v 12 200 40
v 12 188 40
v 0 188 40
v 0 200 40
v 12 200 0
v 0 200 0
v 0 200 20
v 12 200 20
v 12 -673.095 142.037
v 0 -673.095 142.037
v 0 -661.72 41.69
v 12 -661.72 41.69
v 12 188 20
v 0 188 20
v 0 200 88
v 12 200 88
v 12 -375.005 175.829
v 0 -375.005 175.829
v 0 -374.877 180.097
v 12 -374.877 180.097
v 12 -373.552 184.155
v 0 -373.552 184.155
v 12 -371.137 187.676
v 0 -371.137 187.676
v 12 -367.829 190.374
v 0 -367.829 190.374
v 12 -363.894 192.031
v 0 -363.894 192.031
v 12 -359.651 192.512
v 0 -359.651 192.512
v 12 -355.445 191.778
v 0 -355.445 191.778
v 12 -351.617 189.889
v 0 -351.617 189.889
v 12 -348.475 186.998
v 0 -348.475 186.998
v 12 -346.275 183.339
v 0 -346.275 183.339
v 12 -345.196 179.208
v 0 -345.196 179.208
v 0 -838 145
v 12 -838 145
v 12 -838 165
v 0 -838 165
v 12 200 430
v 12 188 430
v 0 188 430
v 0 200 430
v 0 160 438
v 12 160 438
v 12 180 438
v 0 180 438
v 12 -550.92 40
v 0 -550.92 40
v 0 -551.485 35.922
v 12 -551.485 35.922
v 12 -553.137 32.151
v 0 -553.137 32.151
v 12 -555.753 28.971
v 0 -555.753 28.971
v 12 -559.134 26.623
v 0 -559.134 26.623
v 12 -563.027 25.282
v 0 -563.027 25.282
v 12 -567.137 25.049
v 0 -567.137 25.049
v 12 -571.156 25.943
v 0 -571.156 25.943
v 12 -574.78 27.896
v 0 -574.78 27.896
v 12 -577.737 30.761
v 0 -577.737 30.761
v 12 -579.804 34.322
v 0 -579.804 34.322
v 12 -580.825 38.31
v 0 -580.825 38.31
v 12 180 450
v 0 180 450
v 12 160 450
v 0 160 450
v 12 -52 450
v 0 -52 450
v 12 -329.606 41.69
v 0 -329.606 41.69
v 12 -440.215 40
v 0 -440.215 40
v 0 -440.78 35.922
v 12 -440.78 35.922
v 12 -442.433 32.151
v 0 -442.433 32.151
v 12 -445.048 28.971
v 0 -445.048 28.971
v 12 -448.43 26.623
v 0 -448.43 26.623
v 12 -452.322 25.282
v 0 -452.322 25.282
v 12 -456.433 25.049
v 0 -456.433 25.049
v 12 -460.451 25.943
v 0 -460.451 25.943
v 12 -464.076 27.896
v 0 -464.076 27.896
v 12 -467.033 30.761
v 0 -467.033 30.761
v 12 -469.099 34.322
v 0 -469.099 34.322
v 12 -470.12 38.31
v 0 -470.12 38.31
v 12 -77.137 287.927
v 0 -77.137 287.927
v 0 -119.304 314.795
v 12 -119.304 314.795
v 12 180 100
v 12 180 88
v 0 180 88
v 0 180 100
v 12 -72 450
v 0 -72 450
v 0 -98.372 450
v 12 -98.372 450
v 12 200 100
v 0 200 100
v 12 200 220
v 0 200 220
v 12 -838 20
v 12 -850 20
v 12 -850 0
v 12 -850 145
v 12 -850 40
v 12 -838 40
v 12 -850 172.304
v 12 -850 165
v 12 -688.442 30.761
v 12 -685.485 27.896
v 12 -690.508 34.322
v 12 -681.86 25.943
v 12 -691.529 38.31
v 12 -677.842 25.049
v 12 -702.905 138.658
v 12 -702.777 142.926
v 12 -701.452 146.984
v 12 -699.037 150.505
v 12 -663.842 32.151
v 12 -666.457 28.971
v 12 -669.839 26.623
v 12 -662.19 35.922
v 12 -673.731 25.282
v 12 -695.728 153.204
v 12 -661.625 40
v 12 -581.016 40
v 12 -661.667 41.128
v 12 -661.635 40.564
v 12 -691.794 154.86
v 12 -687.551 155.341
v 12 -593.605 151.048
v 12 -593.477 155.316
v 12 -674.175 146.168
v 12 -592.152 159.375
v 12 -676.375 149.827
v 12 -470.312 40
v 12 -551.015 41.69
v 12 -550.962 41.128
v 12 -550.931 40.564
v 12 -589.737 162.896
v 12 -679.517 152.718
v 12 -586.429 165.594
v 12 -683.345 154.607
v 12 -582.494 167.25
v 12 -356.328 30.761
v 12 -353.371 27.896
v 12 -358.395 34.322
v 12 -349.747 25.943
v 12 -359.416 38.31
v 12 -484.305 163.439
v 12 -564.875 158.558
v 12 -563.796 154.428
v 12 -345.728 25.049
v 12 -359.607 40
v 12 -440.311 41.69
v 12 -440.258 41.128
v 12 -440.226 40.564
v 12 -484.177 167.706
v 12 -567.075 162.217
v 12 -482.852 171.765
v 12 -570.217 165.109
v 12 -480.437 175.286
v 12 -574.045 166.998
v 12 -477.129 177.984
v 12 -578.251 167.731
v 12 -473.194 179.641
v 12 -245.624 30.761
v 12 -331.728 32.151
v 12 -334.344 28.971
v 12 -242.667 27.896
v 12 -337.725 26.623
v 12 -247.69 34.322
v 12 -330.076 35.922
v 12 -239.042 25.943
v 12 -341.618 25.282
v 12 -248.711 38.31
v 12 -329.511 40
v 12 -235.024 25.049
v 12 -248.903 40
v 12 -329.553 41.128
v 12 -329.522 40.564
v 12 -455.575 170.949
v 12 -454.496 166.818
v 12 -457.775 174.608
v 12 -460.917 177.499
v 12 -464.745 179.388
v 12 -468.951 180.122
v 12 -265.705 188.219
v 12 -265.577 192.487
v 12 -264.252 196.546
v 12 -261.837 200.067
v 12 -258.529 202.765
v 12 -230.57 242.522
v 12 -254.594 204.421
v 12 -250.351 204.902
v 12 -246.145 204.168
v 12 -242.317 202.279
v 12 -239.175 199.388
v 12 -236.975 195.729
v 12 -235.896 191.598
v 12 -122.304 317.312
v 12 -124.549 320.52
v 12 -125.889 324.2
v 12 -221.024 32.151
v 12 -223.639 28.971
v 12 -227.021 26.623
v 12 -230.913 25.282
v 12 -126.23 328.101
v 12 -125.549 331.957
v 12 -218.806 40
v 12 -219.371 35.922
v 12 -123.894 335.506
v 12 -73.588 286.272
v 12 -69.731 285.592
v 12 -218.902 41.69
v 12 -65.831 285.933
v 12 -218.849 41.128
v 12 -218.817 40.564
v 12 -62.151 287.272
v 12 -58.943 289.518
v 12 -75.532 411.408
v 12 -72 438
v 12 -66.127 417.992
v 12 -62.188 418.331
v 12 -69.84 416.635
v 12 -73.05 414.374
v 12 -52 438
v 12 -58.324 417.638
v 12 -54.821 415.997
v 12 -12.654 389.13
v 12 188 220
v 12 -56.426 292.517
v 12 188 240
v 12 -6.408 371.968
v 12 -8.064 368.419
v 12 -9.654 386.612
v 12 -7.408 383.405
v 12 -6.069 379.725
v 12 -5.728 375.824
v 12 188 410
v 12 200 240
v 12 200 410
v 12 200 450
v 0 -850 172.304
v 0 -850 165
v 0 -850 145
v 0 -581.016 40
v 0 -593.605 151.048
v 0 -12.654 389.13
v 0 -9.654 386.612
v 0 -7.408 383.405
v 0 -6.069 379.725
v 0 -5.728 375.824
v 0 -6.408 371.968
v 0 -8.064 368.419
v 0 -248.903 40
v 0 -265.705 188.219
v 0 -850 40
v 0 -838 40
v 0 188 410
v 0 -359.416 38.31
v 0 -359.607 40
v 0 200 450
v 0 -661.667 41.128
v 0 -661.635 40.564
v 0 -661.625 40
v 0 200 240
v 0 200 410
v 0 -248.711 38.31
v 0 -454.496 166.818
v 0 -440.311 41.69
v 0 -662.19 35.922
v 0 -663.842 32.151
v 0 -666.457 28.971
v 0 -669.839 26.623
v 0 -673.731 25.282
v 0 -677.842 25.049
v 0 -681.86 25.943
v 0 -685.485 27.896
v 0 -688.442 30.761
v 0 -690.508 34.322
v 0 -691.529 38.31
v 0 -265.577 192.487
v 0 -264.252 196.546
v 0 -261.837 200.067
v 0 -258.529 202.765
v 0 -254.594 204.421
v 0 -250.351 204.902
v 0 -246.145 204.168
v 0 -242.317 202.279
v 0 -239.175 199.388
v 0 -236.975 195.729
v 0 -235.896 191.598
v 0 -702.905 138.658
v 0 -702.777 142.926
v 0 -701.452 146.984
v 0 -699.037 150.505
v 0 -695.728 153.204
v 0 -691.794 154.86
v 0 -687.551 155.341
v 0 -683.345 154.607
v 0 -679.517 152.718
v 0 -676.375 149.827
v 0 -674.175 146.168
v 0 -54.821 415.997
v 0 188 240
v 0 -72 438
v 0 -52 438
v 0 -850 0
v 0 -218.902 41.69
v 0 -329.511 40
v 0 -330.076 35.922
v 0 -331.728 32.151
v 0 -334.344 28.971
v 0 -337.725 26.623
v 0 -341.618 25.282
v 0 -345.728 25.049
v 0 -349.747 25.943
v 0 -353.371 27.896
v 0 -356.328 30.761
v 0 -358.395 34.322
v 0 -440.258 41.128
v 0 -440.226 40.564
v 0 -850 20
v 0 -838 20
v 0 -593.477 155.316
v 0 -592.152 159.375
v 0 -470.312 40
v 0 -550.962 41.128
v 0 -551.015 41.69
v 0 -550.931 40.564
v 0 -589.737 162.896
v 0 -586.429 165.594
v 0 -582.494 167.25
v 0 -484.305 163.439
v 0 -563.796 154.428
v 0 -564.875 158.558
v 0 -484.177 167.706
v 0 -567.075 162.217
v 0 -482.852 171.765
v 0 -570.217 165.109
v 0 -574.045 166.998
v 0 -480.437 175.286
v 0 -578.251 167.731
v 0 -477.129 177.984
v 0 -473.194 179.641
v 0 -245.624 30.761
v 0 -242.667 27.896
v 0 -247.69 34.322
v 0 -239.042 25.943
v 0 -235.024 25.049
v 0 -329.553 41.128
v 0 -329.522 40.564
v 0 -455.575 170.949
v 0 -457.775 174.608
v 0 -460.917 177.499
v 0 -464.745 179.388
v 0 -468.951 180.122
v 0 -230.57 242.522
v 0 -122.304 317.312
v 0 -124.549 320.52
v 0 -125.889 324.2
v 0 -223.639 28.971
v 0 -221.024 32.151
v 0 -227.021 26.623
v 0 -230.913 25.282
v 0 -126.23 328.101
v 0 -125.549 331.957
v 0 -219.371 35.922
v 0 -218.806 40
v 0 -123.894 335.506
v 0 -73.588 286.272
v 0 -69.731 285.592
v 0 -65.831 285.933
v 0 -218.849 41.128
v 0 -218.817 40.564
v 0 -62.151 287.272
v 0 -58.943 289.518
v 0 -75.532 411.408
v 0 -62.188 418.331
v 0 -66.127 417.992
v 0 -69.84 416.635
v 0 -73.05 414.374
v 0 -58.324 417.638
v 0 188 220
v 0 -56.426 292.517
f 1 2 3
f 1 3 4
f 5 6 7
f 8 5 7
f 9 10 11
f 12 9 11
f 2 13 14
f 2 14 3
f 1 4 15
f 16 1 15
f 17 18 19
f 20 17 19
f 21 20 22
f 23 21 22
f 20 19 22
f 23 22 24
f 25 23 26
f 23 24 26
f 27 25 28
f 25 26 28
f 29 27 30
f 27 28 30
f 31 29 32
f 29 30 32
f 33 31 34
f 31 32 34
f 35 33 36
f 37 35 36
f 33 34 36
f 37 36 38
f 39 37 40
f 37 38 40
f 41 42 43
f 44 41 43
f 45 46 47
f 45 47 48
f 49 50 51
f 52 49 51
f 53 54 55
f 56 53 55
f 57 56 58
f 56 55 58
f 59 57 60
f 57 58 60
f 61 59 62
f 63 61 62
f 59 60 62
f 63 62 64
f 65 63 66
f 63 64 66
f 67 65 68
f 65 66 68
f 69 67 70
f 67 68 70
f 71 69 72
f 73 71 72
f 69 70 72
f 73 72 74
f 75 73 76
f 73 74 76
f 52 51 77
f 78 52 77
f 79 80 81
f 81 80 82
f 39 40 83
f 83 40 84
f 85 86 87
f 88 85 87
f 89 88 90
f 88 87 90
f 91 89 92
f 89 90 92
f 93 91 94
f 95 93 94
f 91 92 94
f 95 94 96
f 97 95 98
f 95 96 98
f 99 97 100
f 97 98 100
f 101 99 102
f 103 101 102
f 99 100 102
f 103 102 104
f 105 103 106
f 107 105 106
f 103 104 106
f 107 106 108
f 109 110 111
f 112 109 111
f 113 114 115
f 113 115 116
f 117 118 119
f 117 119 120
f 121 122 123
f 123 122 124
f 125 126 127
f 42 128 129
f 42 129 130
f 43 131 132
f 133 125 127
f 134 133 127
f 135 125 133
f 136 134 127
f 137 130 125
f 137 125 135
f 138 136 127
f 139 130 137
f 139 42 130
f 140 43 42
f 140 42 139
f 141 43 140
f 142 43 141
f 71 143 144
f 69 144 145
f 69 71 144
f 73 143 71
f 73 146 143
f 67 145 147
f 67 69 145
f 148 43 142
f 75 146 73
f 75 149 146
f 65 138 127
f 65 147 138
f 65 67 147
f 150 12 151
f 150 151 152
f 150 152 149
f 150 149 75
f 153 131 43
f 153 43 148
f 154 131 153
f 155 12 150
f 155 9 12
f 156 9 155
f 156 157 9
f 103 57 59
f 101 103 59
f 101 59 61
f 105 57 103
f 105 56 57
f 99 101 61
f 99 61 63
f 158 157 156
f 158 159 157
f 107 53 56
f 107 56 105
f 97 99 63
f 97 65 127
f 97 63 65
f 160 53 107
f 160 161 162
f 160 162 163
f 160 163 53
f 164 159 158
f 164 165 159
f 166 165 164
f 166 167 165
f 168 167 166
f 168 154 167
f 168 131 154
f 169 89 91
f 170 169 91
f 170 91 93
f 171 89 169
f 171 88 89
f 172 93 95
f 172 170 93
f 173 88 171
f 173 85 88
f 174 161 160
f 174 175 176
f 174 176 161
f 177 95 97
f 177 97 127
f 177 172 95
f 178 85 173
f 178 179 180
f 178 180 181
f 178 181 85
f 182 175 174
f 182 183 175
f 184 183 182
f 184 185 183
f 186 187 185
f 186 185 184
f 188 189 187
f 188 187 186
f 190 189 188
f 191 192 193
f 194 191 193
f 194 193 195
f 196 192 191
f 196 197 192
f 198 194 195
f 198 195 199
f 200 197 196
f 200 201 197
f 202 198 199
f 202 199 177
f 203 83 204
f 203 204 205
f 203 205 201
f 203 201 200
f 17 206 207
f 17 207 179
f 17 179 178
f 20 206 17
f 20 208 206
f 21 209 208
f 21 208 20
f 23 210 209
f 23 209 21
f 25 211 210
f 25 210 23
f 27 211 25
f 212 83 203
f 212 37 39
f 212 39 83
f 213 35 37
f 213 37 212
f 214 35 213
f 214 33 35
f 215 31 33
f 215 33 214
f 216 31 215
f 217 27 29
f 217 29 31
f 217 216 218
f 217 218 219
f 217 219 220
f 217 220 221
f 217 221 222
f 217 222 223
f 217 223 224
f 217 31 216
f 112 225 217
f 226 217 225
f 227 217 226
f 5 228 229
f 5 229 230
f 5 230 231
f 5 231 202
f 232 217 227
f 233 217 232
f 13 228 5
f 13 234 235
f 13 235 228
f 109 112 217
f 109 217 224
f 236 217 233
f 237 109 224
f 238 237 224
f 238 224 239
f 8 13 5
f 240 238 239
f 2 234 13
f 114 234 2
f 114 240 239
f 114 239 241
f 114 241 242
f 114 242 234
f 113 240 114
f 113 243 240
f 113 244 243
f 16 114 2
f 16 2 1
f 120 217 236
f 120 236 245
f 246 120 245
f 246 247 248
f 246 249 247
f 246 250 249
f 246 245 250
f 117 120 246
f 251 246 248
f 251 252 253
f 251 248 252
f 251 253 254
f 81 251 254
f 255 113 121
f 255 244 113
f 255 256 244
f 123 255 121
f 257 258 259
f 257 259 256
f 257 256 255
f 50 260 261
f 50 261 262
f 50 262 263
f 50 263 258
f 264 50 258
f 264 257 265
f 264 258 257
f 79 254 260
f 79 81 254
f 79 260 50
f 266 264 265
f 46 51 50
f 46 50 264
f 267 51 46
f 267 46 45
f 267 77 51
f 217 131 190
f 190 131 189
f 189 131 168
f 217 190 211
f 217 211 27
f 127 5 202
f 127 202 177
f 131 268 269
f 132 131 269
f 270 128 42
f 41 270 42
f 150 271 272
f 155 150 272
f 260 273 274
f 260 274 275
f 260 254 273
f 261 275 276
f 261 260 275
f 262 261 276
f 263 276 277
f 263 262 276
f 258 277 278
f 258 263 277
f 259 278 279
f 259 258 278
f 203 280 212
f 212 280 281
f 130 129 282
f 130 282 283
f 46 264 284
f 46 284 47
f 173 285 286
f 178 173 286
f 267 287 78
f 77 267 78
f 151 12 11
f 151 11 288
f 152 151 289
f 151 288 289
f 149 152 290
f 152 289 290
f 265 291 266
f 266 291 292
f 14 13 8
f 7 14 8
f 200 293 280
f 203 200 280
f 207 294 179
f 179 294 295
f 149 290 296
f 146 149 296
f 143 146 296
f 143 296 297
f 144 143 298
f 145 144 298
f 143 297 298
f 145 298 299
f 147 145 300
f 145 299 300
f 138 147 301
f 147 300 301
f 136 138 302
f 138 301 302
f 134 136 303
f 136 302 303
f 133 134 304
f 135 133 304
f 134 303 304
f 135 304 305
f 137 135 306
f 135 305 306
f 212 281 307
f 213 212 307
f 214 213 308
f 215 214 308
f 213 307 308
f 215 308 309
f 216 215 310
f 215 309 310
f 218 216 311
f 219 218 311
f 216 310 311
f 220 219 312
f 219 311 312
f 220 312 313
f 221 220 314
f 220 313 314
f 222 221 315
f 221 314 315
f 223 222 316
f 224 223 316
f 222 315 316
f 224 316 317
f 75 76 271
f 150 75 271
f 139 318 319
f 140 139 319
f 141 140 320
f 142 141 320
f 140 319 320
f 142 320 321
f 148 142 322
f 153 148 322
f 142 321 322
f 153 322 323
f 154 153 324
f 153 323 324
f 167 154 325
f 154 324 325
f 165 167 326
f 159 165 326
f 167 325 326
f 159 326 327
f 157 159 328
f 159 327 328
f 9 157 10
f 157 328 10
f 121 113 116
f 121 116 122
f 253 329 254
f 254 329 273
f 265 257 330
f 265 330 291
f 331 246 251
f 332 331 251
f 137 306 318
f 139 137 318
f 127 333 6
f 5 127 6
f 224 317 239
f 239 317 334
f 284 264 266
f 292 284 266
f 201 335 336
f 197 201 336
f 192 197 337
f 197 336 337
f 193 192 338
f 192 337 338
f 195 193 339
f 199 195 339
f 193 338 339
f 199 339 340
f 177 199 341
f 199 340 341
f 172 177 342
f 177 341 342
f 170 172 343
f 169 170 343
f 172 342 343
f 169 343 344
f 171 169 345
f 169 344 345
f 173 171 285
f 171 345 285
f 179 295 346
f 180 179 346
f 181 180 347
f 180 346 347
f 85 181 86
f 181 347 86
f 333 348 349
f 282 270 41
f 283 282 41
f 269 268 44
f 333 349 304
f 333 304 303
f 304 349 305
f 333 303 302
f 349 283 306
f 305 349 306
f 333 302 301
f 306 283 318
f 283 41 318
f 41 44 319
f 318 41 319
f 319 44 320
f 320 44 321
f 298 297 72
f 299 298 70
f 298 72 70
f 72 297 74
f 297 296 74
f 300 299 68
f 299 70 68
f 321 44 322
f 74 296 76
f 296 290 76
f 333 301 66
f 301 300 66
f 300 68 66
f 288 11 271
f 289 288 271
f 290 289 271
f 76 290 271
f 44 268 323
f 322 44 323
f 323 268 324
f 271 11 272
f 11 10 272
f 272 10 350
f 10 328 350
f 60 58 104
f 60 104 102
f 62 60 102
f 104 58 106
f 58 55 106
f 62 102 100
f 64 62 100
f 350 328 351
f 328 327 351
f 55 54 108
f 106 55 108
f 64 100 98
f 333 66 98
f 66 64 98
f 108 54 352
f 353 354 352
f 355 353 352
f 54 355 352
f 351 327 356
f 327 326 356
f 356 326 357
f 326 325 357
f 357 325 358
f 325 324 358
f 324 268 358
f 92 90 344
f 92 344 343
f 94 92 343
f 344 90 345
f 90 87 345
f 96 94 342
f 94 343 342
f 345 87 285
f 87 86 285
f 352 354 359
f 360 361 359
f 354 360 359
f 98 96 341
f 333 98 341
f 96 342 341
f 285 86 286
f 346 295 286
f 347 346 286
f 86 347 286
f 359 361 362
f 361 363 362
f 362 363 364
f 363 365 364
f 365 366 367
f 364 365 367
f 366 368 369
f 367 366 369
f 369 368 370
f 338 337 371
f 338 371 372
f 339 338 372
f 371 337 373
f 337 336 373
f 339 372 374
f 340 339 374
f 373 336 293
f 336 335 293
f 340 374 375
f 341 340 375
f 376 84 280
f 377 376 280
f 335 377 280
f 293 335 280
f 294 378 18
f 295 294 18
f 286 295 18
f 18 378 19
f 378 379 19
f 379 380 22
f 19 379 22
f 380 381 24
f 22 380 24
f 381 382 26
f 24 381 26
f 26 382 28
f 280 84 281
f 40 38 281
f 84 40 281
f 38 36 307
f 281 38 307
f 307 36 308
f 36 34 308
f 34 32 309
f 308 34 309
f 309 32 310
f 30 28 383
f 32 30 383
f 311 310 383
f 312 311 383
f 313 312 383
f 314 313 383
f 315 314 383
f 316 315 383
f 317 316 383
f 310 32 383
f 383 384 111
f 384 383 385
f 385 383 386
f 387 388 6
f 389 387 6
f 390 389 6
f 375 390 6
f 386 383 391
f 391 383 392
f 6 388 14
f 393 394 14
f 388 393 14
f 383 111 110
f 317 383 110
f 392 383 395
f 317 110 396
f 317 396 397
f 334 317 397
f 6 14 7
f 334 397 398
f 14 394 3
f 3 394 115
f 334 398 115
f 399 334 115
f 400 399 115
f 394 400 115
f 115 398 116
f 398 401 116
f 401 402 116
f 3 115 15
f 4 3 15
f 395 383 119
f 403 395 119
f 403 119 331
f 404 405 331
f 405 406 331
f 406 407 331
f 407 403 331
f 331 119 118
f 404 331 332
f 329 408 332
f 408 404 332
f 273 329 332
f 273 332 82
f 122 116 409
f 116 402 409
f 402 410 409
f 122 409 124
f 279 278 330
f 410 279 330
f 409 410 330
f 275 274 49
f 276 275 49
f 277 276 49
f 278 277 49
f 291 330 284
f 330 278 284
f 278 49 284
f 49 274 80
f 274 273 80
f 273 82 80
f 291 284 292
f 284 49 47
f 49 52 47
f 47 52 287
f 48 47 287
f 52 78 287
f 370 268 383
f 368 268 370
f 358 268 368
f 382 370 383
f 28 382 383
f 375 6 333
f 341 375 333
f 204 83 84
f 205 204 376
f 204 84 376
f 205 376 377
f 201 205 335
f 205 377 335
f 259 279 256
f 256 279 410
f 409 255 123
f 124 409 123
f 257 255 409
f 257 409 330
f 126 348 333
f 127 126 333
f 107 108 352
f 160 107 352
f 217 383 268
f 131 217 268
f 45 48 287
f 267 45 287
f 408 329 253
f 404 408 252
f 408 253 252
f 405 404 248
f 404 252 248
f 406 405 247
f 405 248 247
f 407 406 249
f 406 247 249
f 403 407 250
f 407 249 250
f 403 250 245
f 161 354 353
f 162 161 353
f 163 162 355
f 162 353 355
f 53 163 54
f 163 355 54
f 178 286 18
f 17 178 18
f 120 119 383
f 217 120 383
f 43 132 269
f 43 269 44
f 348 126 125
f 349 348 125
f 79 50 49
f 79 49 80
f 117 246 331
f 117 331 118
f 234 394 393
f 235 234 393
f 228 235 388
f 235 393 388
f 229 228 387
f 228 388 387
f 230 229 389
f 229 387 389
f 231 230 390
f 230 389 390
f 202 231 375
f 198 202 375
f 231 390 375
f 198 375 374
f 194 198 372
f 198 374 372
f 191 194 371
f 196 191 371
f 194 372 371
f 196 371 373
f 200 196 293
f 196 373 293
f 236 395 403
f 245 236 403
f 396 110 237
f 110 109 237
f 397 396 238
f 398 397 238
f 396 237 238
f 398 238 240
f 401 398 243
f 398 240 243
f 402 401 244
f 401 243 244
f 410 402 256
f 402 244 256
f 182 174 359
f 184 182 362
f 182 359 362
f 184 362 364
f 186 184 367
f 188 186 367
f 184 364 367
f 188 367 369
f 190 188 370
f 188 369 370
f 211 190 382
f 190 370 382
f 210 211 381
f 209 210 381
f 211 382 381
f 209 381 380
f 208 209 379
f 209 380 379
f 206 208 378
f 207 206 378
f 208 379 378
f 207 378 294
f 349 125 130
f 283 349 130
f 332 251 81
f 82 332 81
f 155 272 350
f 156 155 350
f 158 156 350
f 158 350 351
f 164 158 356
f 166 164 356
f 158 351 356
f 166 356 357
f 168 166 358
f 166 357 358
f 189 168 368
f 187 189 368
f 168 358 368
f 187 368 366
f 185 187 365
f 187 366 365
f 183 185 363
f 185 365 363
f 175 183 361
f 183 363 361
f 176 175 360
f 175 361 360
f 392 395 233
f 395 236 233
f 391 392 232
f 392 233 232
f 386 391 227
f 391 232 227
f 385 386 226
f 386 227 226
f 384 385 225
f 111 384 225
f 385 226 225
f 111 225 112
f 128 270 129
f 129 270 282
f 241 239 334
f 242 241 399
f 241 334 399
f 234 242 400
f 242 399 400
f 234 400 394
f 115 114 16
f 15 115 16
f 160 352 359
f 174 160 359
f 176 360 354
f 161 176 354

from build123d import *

# Parameters (mm, degrees)
F0_W     = 200
F0_H     = 460
F1_DEPTH = 12
F2_W     = 12
F2_H     = 20
F2_W_2   = 20
F2_H_2   = 22
F3_DEPTH = 25
F4_R     = 15
F5_W     = 20
F5_H     = 12
F6_DEPTH = 25
F7_DEPTH = 10
F8_DEPTH = 25


with BuildPart() as f1:
    # F0 (on Right) → F1 (new body)
    with BuildSketch(Plane.YZ):
        with BuildLine():
            Line((-738, 185), (-738, 134.6797614515))
            Line((-738, 134.6797614515), (-702.9045398359, 138.6581941826))
            ThreePointArc((-702.9045398359, 138.6581941826), (-689.6895834632, 155.2523174818), (-673.0954601641, 142.037361109))
            Line((-673.0954601641, 142.037361109), (-593.6045810391, 151.0484729126))
            ThreePointArc((-593.6045810391, 151.0484729126), (-580.3896246663, 167.6425962118), (-563.7955013672, 154.427639839))
            Line((-563.7955013672, 154.427639839), (-484.3046222422, 163.4387516427))
            ThreePointArc((-484.3046222422, 163.4387516427), (-471.0896658695, 180.0328749418), (-454.4955425704, 166.817918569))
            Line((-454.4955425704, 166.817918569), (-375.0046634454, 175.8290303727))
            ThreePointArc((-375.0046634454, 175.8290303727), (-361.7897070726, 192.4231536718), (-345.1955837735, 179.208197299))
            Line((-345.1955837735, 179.208197299), (-265.7047046485, 188.2193091027))
            ThreePointArc((-265.7047046485, 188.2193091027), (-252.4897482758, 204.8134324018), (-235.8956249767, 191.598476029))
            Line((-235.8956249767, 191.598476029), (-201.2256178564, 195.5286792653))
            Line((-201.2256178564, 195.5286792653), (-123.5209909069, 317.4817743388))
            Line((-123.5209909069, 317.4817743388), (-131.9545312744, 322.8553575818))
            Line((-131.9545312744, 322.8553575818), (-67.4715323582, 424.0578419919))
            Line((-67.4715323582, 424.0578419919), (-59.0379919907, 418.6842587489))
            Line((-59.0379919907, 418.6842587489), (-32.7129179192, 460))
            Line((-32.7129179192, 460), (-92, 460))
            Line((-92, 460), (-100.5596901216, 446.5660418925))
            Line((-100.5596901216, 446.5660418925), (-230.5697625024, 242.5224560726))
            Line((-230.5697625024, 242.5224560726), (-738, 185))
        make_face()
        with BuildLine():
            Line((-593.6045810391, 151.0484729126), (-673.0954601641, 142.037361109))
            Line((-673.0954601641, 142.037361109), (-661.7200035888, 41.6895834632))
            ThreePointArc((-661.7200035888, 41.6895834632), (-661.6484274807, 40.8461390137), (-661.6245434248, 40))
            Line((-661.6245434248, 40), (-581.0160901826, 40))
            Line((-581.0160901826, 40), (-593.6045810391, 151.0484729126))
        make_face()
        with BuildLine():
            Line((-738, 0), (0, 0))
            Line((0, 0), (0, 460))
            Line((0, 460), (-32.7129179192, 460))
            Line((-32.7129179192, 460), (-59.0379919907, 418.6842587489))
            Line((-59.0379919907, 418.6842587489), (-0.0032094182, 381.0691760478))
            Line((-0.0032094182, 381.0691760478), (-64.4862083343, 279.8666916377))
            Line((-64.4862083343, 279.8666916377), (-123.5209909069, 317.4817743388))
            Line((-123.5209909069, 317.4817743388), (-201.2256178564, 195.5286792653))
            Line((-201.2256178564, 195.5286792653), (-231.0372798934, 148.7409319016))
            Line((-231.0372798934, 148.7409319016), (-218.9019043619, 41.6895834632))
            ThreePointArc((-218.9019043619, 41.6895834632), (-218.8303282538, 40.8461390137), (-218.8064441979, 40))
            ThreePointArc((-218.8064441979, 40), (-232.9603051842, 25.023884056), (-248.7109840338, 38.3104165368))
            Line((-248.7109840338, 38.3104165368), (-248.9025157624, 40))
            Line((-248.9025157624, 40), (-329.5109690046, 40))
            ThreePointArc((-329.5109690046, 40), (-343.6648299909, 25.023884056), (-359.4155088405, 38.3104165368))
            Line((-359.4155088405, 38.3104165368), (-359.6070405691, 40))
            Line((-359.6070405691, 40), (-440.2154938113, 40))
            ThreePointArc((-440.2154938113, 40), (-454.3693547976, 25.023884056), (-470.1200336472, 38.3104165368))
            Line((-470.1200336472, 38.3104165368), (-470.3115653759, 40))
            Line((-470.3115653759, 40), (-550.920018618, 40))
            ThreePointArc((-550.920018618, 40), (-565.0738796043, 25.023884056), (-580.824558454, 38.3104165368))
            Line((-580.824558454, 38.3104165368), (-581.0160901826, 40))
            Line((-581.0160901826, 40), (-661.6245434248, 40))
            ThreePointArc((-661.6245434248, 40), (-675.7784044111, 25.023884056), (-691.5290832607, 38.3104165368))
            Line((-691.5290832607, 38.3104165368), (-702.9045398359, 138.6581941826))
            Line((-702.9045398359, 138.6581941826), (-738, 134.6797614515))
            Line((-738, 134.6797614515), (-738, 0))
        make_face()
        with BuildLine():
            Line((-484.3046222422, 163.4387516427), (-563.7955013672, 154.427639839))
            Line((-563.7955013672, 154.427639839), (-551.0154787821, 41.6895834632))
            ThreePointArc((-551.0154787821, 41.6895834632), (-550.943902674, 40.8461390137), (-550.920018618, 40))
            Line((-550.920018618, 40), (-470.3115653759, 40))
            Line((-470.3115653759, 40), (-484.3046222422, 163.4387516427))
        make_face()
        with BuildLine():
            Line((-375.0046634454, 175.8290303727), (-454.4955425704, 166.817918569))
            Line((-454.4955425704, 166.817918569), (-440.3109539754, 41.6895834632))
            ThreePointArc((-440.3109539754, 41.6895834632), (-440.2393778673, 40.8461390137), (-440.2154938113, 40))
            Line((-440.2154938113, 40), (-359.6070405691, 40))
            Line((-359.6070405691, 40), (-375.0046634454, 175.8290303727))
        make_face()
        with BuildLine():
            Line((-256.6691814309, 108.513086433), (-265.7047046485, 188.2193091027))
            Line((-265.7047046485, 188.2193091027), (-345.1955837735, 179.208197299))
            Line((-345.1955837735, 179.208197299), (-329.6064291686, 41.6895834632))
            ThreePointArc((-329.6064291686, 41.6895834632), (-329.5348530605, 40.8461390137), (-329.5109690046, 40))
            Line((-329.5109690046, 40), (-248.9025157624, 40))
            Line((-248.9025157624, 40), (-256.6691814309, 108.513086433))
        make_face()
        Polygon((-231.0372798934, 148.7409319016), (-201.2256178564, 195.5286792653), (-235.8956249767, 191.598476029), align=None)
        with Locations((100, 230)):
            Rectangle(F0_W, F0_H)
        Polygon((-850, 0), (-738, 0), (-738, 134.6797614515), (-738, 185), (-850, 172.3036437247), align=None)
    extrude(amount=F1_DEPTH)

    # F2 (on face) → F3 (cut)
    with BuildSketch(Plane.YZ.offset(12)):
        with Locations((-844, 30)):
            Rectangle(F2_W, F2_H)
        with Locations((-844, 155)):
            Rectangle(F2_W, F2_H)
        with Locations((194, 30)):
            Rectangle(F2_W, F2_H)
        with Locations((194, 230)):
            Rectangle(F2_W, F2_H)
        with Locations((194, 420)):
            Rectangle(F2_W, F2_H)
        with Locations((170, 449)):
            Rectangle(F2_W_2, F2_H_2)
        with Locations((-62, 449)):
            Rectangle(F2_W_2, F2_H_2)
    extrude(amount=-F3_DEPTH, mode=Mode.SUBTRACT)

    # F4
    f4_edges = [f1.edges().sort_by_distance(p)[0] for p in [
        (6, -67.471532, 424.057842),
        (6, -131.954531, 322.855358),
        (6, -0.003209, 381.069176),
        (6, -64.486208, 279.866692),
    ]]
    fillet(f4_edges, radius=F4_R)

    # F5 (on face) → F6 (cut)
    with BuildSketch(Plane.YZ.offset(12)):
        with Locations((190, 94)):
            Rectangle(F5_W, F5_H)
    extrude(amount=-F6_DEPTH, mode=Mode.SUBTRACT)

    # F7 (cut): faces of the model
    f7_faces = [f1.faces().sort_by_distance(p)[0] for p in [
        (6, -82, 460),
        (6, 54, 460),
        (6, 190, 460),
    ]]
    extrude(f7_faces, amount=-F7_DEPTH, mode=Mode.SUBTRACT)

    # F8 (cut): a face of the model
    f8_faces = [f1.faces().sort_by_distance(p)[0] for p in [
        (6, -92, 455),
    ]]
    extrude(f8_faces, amount=-F8_DEPTH, mode=Mode.SUBTRACT)


solid = f1.part
